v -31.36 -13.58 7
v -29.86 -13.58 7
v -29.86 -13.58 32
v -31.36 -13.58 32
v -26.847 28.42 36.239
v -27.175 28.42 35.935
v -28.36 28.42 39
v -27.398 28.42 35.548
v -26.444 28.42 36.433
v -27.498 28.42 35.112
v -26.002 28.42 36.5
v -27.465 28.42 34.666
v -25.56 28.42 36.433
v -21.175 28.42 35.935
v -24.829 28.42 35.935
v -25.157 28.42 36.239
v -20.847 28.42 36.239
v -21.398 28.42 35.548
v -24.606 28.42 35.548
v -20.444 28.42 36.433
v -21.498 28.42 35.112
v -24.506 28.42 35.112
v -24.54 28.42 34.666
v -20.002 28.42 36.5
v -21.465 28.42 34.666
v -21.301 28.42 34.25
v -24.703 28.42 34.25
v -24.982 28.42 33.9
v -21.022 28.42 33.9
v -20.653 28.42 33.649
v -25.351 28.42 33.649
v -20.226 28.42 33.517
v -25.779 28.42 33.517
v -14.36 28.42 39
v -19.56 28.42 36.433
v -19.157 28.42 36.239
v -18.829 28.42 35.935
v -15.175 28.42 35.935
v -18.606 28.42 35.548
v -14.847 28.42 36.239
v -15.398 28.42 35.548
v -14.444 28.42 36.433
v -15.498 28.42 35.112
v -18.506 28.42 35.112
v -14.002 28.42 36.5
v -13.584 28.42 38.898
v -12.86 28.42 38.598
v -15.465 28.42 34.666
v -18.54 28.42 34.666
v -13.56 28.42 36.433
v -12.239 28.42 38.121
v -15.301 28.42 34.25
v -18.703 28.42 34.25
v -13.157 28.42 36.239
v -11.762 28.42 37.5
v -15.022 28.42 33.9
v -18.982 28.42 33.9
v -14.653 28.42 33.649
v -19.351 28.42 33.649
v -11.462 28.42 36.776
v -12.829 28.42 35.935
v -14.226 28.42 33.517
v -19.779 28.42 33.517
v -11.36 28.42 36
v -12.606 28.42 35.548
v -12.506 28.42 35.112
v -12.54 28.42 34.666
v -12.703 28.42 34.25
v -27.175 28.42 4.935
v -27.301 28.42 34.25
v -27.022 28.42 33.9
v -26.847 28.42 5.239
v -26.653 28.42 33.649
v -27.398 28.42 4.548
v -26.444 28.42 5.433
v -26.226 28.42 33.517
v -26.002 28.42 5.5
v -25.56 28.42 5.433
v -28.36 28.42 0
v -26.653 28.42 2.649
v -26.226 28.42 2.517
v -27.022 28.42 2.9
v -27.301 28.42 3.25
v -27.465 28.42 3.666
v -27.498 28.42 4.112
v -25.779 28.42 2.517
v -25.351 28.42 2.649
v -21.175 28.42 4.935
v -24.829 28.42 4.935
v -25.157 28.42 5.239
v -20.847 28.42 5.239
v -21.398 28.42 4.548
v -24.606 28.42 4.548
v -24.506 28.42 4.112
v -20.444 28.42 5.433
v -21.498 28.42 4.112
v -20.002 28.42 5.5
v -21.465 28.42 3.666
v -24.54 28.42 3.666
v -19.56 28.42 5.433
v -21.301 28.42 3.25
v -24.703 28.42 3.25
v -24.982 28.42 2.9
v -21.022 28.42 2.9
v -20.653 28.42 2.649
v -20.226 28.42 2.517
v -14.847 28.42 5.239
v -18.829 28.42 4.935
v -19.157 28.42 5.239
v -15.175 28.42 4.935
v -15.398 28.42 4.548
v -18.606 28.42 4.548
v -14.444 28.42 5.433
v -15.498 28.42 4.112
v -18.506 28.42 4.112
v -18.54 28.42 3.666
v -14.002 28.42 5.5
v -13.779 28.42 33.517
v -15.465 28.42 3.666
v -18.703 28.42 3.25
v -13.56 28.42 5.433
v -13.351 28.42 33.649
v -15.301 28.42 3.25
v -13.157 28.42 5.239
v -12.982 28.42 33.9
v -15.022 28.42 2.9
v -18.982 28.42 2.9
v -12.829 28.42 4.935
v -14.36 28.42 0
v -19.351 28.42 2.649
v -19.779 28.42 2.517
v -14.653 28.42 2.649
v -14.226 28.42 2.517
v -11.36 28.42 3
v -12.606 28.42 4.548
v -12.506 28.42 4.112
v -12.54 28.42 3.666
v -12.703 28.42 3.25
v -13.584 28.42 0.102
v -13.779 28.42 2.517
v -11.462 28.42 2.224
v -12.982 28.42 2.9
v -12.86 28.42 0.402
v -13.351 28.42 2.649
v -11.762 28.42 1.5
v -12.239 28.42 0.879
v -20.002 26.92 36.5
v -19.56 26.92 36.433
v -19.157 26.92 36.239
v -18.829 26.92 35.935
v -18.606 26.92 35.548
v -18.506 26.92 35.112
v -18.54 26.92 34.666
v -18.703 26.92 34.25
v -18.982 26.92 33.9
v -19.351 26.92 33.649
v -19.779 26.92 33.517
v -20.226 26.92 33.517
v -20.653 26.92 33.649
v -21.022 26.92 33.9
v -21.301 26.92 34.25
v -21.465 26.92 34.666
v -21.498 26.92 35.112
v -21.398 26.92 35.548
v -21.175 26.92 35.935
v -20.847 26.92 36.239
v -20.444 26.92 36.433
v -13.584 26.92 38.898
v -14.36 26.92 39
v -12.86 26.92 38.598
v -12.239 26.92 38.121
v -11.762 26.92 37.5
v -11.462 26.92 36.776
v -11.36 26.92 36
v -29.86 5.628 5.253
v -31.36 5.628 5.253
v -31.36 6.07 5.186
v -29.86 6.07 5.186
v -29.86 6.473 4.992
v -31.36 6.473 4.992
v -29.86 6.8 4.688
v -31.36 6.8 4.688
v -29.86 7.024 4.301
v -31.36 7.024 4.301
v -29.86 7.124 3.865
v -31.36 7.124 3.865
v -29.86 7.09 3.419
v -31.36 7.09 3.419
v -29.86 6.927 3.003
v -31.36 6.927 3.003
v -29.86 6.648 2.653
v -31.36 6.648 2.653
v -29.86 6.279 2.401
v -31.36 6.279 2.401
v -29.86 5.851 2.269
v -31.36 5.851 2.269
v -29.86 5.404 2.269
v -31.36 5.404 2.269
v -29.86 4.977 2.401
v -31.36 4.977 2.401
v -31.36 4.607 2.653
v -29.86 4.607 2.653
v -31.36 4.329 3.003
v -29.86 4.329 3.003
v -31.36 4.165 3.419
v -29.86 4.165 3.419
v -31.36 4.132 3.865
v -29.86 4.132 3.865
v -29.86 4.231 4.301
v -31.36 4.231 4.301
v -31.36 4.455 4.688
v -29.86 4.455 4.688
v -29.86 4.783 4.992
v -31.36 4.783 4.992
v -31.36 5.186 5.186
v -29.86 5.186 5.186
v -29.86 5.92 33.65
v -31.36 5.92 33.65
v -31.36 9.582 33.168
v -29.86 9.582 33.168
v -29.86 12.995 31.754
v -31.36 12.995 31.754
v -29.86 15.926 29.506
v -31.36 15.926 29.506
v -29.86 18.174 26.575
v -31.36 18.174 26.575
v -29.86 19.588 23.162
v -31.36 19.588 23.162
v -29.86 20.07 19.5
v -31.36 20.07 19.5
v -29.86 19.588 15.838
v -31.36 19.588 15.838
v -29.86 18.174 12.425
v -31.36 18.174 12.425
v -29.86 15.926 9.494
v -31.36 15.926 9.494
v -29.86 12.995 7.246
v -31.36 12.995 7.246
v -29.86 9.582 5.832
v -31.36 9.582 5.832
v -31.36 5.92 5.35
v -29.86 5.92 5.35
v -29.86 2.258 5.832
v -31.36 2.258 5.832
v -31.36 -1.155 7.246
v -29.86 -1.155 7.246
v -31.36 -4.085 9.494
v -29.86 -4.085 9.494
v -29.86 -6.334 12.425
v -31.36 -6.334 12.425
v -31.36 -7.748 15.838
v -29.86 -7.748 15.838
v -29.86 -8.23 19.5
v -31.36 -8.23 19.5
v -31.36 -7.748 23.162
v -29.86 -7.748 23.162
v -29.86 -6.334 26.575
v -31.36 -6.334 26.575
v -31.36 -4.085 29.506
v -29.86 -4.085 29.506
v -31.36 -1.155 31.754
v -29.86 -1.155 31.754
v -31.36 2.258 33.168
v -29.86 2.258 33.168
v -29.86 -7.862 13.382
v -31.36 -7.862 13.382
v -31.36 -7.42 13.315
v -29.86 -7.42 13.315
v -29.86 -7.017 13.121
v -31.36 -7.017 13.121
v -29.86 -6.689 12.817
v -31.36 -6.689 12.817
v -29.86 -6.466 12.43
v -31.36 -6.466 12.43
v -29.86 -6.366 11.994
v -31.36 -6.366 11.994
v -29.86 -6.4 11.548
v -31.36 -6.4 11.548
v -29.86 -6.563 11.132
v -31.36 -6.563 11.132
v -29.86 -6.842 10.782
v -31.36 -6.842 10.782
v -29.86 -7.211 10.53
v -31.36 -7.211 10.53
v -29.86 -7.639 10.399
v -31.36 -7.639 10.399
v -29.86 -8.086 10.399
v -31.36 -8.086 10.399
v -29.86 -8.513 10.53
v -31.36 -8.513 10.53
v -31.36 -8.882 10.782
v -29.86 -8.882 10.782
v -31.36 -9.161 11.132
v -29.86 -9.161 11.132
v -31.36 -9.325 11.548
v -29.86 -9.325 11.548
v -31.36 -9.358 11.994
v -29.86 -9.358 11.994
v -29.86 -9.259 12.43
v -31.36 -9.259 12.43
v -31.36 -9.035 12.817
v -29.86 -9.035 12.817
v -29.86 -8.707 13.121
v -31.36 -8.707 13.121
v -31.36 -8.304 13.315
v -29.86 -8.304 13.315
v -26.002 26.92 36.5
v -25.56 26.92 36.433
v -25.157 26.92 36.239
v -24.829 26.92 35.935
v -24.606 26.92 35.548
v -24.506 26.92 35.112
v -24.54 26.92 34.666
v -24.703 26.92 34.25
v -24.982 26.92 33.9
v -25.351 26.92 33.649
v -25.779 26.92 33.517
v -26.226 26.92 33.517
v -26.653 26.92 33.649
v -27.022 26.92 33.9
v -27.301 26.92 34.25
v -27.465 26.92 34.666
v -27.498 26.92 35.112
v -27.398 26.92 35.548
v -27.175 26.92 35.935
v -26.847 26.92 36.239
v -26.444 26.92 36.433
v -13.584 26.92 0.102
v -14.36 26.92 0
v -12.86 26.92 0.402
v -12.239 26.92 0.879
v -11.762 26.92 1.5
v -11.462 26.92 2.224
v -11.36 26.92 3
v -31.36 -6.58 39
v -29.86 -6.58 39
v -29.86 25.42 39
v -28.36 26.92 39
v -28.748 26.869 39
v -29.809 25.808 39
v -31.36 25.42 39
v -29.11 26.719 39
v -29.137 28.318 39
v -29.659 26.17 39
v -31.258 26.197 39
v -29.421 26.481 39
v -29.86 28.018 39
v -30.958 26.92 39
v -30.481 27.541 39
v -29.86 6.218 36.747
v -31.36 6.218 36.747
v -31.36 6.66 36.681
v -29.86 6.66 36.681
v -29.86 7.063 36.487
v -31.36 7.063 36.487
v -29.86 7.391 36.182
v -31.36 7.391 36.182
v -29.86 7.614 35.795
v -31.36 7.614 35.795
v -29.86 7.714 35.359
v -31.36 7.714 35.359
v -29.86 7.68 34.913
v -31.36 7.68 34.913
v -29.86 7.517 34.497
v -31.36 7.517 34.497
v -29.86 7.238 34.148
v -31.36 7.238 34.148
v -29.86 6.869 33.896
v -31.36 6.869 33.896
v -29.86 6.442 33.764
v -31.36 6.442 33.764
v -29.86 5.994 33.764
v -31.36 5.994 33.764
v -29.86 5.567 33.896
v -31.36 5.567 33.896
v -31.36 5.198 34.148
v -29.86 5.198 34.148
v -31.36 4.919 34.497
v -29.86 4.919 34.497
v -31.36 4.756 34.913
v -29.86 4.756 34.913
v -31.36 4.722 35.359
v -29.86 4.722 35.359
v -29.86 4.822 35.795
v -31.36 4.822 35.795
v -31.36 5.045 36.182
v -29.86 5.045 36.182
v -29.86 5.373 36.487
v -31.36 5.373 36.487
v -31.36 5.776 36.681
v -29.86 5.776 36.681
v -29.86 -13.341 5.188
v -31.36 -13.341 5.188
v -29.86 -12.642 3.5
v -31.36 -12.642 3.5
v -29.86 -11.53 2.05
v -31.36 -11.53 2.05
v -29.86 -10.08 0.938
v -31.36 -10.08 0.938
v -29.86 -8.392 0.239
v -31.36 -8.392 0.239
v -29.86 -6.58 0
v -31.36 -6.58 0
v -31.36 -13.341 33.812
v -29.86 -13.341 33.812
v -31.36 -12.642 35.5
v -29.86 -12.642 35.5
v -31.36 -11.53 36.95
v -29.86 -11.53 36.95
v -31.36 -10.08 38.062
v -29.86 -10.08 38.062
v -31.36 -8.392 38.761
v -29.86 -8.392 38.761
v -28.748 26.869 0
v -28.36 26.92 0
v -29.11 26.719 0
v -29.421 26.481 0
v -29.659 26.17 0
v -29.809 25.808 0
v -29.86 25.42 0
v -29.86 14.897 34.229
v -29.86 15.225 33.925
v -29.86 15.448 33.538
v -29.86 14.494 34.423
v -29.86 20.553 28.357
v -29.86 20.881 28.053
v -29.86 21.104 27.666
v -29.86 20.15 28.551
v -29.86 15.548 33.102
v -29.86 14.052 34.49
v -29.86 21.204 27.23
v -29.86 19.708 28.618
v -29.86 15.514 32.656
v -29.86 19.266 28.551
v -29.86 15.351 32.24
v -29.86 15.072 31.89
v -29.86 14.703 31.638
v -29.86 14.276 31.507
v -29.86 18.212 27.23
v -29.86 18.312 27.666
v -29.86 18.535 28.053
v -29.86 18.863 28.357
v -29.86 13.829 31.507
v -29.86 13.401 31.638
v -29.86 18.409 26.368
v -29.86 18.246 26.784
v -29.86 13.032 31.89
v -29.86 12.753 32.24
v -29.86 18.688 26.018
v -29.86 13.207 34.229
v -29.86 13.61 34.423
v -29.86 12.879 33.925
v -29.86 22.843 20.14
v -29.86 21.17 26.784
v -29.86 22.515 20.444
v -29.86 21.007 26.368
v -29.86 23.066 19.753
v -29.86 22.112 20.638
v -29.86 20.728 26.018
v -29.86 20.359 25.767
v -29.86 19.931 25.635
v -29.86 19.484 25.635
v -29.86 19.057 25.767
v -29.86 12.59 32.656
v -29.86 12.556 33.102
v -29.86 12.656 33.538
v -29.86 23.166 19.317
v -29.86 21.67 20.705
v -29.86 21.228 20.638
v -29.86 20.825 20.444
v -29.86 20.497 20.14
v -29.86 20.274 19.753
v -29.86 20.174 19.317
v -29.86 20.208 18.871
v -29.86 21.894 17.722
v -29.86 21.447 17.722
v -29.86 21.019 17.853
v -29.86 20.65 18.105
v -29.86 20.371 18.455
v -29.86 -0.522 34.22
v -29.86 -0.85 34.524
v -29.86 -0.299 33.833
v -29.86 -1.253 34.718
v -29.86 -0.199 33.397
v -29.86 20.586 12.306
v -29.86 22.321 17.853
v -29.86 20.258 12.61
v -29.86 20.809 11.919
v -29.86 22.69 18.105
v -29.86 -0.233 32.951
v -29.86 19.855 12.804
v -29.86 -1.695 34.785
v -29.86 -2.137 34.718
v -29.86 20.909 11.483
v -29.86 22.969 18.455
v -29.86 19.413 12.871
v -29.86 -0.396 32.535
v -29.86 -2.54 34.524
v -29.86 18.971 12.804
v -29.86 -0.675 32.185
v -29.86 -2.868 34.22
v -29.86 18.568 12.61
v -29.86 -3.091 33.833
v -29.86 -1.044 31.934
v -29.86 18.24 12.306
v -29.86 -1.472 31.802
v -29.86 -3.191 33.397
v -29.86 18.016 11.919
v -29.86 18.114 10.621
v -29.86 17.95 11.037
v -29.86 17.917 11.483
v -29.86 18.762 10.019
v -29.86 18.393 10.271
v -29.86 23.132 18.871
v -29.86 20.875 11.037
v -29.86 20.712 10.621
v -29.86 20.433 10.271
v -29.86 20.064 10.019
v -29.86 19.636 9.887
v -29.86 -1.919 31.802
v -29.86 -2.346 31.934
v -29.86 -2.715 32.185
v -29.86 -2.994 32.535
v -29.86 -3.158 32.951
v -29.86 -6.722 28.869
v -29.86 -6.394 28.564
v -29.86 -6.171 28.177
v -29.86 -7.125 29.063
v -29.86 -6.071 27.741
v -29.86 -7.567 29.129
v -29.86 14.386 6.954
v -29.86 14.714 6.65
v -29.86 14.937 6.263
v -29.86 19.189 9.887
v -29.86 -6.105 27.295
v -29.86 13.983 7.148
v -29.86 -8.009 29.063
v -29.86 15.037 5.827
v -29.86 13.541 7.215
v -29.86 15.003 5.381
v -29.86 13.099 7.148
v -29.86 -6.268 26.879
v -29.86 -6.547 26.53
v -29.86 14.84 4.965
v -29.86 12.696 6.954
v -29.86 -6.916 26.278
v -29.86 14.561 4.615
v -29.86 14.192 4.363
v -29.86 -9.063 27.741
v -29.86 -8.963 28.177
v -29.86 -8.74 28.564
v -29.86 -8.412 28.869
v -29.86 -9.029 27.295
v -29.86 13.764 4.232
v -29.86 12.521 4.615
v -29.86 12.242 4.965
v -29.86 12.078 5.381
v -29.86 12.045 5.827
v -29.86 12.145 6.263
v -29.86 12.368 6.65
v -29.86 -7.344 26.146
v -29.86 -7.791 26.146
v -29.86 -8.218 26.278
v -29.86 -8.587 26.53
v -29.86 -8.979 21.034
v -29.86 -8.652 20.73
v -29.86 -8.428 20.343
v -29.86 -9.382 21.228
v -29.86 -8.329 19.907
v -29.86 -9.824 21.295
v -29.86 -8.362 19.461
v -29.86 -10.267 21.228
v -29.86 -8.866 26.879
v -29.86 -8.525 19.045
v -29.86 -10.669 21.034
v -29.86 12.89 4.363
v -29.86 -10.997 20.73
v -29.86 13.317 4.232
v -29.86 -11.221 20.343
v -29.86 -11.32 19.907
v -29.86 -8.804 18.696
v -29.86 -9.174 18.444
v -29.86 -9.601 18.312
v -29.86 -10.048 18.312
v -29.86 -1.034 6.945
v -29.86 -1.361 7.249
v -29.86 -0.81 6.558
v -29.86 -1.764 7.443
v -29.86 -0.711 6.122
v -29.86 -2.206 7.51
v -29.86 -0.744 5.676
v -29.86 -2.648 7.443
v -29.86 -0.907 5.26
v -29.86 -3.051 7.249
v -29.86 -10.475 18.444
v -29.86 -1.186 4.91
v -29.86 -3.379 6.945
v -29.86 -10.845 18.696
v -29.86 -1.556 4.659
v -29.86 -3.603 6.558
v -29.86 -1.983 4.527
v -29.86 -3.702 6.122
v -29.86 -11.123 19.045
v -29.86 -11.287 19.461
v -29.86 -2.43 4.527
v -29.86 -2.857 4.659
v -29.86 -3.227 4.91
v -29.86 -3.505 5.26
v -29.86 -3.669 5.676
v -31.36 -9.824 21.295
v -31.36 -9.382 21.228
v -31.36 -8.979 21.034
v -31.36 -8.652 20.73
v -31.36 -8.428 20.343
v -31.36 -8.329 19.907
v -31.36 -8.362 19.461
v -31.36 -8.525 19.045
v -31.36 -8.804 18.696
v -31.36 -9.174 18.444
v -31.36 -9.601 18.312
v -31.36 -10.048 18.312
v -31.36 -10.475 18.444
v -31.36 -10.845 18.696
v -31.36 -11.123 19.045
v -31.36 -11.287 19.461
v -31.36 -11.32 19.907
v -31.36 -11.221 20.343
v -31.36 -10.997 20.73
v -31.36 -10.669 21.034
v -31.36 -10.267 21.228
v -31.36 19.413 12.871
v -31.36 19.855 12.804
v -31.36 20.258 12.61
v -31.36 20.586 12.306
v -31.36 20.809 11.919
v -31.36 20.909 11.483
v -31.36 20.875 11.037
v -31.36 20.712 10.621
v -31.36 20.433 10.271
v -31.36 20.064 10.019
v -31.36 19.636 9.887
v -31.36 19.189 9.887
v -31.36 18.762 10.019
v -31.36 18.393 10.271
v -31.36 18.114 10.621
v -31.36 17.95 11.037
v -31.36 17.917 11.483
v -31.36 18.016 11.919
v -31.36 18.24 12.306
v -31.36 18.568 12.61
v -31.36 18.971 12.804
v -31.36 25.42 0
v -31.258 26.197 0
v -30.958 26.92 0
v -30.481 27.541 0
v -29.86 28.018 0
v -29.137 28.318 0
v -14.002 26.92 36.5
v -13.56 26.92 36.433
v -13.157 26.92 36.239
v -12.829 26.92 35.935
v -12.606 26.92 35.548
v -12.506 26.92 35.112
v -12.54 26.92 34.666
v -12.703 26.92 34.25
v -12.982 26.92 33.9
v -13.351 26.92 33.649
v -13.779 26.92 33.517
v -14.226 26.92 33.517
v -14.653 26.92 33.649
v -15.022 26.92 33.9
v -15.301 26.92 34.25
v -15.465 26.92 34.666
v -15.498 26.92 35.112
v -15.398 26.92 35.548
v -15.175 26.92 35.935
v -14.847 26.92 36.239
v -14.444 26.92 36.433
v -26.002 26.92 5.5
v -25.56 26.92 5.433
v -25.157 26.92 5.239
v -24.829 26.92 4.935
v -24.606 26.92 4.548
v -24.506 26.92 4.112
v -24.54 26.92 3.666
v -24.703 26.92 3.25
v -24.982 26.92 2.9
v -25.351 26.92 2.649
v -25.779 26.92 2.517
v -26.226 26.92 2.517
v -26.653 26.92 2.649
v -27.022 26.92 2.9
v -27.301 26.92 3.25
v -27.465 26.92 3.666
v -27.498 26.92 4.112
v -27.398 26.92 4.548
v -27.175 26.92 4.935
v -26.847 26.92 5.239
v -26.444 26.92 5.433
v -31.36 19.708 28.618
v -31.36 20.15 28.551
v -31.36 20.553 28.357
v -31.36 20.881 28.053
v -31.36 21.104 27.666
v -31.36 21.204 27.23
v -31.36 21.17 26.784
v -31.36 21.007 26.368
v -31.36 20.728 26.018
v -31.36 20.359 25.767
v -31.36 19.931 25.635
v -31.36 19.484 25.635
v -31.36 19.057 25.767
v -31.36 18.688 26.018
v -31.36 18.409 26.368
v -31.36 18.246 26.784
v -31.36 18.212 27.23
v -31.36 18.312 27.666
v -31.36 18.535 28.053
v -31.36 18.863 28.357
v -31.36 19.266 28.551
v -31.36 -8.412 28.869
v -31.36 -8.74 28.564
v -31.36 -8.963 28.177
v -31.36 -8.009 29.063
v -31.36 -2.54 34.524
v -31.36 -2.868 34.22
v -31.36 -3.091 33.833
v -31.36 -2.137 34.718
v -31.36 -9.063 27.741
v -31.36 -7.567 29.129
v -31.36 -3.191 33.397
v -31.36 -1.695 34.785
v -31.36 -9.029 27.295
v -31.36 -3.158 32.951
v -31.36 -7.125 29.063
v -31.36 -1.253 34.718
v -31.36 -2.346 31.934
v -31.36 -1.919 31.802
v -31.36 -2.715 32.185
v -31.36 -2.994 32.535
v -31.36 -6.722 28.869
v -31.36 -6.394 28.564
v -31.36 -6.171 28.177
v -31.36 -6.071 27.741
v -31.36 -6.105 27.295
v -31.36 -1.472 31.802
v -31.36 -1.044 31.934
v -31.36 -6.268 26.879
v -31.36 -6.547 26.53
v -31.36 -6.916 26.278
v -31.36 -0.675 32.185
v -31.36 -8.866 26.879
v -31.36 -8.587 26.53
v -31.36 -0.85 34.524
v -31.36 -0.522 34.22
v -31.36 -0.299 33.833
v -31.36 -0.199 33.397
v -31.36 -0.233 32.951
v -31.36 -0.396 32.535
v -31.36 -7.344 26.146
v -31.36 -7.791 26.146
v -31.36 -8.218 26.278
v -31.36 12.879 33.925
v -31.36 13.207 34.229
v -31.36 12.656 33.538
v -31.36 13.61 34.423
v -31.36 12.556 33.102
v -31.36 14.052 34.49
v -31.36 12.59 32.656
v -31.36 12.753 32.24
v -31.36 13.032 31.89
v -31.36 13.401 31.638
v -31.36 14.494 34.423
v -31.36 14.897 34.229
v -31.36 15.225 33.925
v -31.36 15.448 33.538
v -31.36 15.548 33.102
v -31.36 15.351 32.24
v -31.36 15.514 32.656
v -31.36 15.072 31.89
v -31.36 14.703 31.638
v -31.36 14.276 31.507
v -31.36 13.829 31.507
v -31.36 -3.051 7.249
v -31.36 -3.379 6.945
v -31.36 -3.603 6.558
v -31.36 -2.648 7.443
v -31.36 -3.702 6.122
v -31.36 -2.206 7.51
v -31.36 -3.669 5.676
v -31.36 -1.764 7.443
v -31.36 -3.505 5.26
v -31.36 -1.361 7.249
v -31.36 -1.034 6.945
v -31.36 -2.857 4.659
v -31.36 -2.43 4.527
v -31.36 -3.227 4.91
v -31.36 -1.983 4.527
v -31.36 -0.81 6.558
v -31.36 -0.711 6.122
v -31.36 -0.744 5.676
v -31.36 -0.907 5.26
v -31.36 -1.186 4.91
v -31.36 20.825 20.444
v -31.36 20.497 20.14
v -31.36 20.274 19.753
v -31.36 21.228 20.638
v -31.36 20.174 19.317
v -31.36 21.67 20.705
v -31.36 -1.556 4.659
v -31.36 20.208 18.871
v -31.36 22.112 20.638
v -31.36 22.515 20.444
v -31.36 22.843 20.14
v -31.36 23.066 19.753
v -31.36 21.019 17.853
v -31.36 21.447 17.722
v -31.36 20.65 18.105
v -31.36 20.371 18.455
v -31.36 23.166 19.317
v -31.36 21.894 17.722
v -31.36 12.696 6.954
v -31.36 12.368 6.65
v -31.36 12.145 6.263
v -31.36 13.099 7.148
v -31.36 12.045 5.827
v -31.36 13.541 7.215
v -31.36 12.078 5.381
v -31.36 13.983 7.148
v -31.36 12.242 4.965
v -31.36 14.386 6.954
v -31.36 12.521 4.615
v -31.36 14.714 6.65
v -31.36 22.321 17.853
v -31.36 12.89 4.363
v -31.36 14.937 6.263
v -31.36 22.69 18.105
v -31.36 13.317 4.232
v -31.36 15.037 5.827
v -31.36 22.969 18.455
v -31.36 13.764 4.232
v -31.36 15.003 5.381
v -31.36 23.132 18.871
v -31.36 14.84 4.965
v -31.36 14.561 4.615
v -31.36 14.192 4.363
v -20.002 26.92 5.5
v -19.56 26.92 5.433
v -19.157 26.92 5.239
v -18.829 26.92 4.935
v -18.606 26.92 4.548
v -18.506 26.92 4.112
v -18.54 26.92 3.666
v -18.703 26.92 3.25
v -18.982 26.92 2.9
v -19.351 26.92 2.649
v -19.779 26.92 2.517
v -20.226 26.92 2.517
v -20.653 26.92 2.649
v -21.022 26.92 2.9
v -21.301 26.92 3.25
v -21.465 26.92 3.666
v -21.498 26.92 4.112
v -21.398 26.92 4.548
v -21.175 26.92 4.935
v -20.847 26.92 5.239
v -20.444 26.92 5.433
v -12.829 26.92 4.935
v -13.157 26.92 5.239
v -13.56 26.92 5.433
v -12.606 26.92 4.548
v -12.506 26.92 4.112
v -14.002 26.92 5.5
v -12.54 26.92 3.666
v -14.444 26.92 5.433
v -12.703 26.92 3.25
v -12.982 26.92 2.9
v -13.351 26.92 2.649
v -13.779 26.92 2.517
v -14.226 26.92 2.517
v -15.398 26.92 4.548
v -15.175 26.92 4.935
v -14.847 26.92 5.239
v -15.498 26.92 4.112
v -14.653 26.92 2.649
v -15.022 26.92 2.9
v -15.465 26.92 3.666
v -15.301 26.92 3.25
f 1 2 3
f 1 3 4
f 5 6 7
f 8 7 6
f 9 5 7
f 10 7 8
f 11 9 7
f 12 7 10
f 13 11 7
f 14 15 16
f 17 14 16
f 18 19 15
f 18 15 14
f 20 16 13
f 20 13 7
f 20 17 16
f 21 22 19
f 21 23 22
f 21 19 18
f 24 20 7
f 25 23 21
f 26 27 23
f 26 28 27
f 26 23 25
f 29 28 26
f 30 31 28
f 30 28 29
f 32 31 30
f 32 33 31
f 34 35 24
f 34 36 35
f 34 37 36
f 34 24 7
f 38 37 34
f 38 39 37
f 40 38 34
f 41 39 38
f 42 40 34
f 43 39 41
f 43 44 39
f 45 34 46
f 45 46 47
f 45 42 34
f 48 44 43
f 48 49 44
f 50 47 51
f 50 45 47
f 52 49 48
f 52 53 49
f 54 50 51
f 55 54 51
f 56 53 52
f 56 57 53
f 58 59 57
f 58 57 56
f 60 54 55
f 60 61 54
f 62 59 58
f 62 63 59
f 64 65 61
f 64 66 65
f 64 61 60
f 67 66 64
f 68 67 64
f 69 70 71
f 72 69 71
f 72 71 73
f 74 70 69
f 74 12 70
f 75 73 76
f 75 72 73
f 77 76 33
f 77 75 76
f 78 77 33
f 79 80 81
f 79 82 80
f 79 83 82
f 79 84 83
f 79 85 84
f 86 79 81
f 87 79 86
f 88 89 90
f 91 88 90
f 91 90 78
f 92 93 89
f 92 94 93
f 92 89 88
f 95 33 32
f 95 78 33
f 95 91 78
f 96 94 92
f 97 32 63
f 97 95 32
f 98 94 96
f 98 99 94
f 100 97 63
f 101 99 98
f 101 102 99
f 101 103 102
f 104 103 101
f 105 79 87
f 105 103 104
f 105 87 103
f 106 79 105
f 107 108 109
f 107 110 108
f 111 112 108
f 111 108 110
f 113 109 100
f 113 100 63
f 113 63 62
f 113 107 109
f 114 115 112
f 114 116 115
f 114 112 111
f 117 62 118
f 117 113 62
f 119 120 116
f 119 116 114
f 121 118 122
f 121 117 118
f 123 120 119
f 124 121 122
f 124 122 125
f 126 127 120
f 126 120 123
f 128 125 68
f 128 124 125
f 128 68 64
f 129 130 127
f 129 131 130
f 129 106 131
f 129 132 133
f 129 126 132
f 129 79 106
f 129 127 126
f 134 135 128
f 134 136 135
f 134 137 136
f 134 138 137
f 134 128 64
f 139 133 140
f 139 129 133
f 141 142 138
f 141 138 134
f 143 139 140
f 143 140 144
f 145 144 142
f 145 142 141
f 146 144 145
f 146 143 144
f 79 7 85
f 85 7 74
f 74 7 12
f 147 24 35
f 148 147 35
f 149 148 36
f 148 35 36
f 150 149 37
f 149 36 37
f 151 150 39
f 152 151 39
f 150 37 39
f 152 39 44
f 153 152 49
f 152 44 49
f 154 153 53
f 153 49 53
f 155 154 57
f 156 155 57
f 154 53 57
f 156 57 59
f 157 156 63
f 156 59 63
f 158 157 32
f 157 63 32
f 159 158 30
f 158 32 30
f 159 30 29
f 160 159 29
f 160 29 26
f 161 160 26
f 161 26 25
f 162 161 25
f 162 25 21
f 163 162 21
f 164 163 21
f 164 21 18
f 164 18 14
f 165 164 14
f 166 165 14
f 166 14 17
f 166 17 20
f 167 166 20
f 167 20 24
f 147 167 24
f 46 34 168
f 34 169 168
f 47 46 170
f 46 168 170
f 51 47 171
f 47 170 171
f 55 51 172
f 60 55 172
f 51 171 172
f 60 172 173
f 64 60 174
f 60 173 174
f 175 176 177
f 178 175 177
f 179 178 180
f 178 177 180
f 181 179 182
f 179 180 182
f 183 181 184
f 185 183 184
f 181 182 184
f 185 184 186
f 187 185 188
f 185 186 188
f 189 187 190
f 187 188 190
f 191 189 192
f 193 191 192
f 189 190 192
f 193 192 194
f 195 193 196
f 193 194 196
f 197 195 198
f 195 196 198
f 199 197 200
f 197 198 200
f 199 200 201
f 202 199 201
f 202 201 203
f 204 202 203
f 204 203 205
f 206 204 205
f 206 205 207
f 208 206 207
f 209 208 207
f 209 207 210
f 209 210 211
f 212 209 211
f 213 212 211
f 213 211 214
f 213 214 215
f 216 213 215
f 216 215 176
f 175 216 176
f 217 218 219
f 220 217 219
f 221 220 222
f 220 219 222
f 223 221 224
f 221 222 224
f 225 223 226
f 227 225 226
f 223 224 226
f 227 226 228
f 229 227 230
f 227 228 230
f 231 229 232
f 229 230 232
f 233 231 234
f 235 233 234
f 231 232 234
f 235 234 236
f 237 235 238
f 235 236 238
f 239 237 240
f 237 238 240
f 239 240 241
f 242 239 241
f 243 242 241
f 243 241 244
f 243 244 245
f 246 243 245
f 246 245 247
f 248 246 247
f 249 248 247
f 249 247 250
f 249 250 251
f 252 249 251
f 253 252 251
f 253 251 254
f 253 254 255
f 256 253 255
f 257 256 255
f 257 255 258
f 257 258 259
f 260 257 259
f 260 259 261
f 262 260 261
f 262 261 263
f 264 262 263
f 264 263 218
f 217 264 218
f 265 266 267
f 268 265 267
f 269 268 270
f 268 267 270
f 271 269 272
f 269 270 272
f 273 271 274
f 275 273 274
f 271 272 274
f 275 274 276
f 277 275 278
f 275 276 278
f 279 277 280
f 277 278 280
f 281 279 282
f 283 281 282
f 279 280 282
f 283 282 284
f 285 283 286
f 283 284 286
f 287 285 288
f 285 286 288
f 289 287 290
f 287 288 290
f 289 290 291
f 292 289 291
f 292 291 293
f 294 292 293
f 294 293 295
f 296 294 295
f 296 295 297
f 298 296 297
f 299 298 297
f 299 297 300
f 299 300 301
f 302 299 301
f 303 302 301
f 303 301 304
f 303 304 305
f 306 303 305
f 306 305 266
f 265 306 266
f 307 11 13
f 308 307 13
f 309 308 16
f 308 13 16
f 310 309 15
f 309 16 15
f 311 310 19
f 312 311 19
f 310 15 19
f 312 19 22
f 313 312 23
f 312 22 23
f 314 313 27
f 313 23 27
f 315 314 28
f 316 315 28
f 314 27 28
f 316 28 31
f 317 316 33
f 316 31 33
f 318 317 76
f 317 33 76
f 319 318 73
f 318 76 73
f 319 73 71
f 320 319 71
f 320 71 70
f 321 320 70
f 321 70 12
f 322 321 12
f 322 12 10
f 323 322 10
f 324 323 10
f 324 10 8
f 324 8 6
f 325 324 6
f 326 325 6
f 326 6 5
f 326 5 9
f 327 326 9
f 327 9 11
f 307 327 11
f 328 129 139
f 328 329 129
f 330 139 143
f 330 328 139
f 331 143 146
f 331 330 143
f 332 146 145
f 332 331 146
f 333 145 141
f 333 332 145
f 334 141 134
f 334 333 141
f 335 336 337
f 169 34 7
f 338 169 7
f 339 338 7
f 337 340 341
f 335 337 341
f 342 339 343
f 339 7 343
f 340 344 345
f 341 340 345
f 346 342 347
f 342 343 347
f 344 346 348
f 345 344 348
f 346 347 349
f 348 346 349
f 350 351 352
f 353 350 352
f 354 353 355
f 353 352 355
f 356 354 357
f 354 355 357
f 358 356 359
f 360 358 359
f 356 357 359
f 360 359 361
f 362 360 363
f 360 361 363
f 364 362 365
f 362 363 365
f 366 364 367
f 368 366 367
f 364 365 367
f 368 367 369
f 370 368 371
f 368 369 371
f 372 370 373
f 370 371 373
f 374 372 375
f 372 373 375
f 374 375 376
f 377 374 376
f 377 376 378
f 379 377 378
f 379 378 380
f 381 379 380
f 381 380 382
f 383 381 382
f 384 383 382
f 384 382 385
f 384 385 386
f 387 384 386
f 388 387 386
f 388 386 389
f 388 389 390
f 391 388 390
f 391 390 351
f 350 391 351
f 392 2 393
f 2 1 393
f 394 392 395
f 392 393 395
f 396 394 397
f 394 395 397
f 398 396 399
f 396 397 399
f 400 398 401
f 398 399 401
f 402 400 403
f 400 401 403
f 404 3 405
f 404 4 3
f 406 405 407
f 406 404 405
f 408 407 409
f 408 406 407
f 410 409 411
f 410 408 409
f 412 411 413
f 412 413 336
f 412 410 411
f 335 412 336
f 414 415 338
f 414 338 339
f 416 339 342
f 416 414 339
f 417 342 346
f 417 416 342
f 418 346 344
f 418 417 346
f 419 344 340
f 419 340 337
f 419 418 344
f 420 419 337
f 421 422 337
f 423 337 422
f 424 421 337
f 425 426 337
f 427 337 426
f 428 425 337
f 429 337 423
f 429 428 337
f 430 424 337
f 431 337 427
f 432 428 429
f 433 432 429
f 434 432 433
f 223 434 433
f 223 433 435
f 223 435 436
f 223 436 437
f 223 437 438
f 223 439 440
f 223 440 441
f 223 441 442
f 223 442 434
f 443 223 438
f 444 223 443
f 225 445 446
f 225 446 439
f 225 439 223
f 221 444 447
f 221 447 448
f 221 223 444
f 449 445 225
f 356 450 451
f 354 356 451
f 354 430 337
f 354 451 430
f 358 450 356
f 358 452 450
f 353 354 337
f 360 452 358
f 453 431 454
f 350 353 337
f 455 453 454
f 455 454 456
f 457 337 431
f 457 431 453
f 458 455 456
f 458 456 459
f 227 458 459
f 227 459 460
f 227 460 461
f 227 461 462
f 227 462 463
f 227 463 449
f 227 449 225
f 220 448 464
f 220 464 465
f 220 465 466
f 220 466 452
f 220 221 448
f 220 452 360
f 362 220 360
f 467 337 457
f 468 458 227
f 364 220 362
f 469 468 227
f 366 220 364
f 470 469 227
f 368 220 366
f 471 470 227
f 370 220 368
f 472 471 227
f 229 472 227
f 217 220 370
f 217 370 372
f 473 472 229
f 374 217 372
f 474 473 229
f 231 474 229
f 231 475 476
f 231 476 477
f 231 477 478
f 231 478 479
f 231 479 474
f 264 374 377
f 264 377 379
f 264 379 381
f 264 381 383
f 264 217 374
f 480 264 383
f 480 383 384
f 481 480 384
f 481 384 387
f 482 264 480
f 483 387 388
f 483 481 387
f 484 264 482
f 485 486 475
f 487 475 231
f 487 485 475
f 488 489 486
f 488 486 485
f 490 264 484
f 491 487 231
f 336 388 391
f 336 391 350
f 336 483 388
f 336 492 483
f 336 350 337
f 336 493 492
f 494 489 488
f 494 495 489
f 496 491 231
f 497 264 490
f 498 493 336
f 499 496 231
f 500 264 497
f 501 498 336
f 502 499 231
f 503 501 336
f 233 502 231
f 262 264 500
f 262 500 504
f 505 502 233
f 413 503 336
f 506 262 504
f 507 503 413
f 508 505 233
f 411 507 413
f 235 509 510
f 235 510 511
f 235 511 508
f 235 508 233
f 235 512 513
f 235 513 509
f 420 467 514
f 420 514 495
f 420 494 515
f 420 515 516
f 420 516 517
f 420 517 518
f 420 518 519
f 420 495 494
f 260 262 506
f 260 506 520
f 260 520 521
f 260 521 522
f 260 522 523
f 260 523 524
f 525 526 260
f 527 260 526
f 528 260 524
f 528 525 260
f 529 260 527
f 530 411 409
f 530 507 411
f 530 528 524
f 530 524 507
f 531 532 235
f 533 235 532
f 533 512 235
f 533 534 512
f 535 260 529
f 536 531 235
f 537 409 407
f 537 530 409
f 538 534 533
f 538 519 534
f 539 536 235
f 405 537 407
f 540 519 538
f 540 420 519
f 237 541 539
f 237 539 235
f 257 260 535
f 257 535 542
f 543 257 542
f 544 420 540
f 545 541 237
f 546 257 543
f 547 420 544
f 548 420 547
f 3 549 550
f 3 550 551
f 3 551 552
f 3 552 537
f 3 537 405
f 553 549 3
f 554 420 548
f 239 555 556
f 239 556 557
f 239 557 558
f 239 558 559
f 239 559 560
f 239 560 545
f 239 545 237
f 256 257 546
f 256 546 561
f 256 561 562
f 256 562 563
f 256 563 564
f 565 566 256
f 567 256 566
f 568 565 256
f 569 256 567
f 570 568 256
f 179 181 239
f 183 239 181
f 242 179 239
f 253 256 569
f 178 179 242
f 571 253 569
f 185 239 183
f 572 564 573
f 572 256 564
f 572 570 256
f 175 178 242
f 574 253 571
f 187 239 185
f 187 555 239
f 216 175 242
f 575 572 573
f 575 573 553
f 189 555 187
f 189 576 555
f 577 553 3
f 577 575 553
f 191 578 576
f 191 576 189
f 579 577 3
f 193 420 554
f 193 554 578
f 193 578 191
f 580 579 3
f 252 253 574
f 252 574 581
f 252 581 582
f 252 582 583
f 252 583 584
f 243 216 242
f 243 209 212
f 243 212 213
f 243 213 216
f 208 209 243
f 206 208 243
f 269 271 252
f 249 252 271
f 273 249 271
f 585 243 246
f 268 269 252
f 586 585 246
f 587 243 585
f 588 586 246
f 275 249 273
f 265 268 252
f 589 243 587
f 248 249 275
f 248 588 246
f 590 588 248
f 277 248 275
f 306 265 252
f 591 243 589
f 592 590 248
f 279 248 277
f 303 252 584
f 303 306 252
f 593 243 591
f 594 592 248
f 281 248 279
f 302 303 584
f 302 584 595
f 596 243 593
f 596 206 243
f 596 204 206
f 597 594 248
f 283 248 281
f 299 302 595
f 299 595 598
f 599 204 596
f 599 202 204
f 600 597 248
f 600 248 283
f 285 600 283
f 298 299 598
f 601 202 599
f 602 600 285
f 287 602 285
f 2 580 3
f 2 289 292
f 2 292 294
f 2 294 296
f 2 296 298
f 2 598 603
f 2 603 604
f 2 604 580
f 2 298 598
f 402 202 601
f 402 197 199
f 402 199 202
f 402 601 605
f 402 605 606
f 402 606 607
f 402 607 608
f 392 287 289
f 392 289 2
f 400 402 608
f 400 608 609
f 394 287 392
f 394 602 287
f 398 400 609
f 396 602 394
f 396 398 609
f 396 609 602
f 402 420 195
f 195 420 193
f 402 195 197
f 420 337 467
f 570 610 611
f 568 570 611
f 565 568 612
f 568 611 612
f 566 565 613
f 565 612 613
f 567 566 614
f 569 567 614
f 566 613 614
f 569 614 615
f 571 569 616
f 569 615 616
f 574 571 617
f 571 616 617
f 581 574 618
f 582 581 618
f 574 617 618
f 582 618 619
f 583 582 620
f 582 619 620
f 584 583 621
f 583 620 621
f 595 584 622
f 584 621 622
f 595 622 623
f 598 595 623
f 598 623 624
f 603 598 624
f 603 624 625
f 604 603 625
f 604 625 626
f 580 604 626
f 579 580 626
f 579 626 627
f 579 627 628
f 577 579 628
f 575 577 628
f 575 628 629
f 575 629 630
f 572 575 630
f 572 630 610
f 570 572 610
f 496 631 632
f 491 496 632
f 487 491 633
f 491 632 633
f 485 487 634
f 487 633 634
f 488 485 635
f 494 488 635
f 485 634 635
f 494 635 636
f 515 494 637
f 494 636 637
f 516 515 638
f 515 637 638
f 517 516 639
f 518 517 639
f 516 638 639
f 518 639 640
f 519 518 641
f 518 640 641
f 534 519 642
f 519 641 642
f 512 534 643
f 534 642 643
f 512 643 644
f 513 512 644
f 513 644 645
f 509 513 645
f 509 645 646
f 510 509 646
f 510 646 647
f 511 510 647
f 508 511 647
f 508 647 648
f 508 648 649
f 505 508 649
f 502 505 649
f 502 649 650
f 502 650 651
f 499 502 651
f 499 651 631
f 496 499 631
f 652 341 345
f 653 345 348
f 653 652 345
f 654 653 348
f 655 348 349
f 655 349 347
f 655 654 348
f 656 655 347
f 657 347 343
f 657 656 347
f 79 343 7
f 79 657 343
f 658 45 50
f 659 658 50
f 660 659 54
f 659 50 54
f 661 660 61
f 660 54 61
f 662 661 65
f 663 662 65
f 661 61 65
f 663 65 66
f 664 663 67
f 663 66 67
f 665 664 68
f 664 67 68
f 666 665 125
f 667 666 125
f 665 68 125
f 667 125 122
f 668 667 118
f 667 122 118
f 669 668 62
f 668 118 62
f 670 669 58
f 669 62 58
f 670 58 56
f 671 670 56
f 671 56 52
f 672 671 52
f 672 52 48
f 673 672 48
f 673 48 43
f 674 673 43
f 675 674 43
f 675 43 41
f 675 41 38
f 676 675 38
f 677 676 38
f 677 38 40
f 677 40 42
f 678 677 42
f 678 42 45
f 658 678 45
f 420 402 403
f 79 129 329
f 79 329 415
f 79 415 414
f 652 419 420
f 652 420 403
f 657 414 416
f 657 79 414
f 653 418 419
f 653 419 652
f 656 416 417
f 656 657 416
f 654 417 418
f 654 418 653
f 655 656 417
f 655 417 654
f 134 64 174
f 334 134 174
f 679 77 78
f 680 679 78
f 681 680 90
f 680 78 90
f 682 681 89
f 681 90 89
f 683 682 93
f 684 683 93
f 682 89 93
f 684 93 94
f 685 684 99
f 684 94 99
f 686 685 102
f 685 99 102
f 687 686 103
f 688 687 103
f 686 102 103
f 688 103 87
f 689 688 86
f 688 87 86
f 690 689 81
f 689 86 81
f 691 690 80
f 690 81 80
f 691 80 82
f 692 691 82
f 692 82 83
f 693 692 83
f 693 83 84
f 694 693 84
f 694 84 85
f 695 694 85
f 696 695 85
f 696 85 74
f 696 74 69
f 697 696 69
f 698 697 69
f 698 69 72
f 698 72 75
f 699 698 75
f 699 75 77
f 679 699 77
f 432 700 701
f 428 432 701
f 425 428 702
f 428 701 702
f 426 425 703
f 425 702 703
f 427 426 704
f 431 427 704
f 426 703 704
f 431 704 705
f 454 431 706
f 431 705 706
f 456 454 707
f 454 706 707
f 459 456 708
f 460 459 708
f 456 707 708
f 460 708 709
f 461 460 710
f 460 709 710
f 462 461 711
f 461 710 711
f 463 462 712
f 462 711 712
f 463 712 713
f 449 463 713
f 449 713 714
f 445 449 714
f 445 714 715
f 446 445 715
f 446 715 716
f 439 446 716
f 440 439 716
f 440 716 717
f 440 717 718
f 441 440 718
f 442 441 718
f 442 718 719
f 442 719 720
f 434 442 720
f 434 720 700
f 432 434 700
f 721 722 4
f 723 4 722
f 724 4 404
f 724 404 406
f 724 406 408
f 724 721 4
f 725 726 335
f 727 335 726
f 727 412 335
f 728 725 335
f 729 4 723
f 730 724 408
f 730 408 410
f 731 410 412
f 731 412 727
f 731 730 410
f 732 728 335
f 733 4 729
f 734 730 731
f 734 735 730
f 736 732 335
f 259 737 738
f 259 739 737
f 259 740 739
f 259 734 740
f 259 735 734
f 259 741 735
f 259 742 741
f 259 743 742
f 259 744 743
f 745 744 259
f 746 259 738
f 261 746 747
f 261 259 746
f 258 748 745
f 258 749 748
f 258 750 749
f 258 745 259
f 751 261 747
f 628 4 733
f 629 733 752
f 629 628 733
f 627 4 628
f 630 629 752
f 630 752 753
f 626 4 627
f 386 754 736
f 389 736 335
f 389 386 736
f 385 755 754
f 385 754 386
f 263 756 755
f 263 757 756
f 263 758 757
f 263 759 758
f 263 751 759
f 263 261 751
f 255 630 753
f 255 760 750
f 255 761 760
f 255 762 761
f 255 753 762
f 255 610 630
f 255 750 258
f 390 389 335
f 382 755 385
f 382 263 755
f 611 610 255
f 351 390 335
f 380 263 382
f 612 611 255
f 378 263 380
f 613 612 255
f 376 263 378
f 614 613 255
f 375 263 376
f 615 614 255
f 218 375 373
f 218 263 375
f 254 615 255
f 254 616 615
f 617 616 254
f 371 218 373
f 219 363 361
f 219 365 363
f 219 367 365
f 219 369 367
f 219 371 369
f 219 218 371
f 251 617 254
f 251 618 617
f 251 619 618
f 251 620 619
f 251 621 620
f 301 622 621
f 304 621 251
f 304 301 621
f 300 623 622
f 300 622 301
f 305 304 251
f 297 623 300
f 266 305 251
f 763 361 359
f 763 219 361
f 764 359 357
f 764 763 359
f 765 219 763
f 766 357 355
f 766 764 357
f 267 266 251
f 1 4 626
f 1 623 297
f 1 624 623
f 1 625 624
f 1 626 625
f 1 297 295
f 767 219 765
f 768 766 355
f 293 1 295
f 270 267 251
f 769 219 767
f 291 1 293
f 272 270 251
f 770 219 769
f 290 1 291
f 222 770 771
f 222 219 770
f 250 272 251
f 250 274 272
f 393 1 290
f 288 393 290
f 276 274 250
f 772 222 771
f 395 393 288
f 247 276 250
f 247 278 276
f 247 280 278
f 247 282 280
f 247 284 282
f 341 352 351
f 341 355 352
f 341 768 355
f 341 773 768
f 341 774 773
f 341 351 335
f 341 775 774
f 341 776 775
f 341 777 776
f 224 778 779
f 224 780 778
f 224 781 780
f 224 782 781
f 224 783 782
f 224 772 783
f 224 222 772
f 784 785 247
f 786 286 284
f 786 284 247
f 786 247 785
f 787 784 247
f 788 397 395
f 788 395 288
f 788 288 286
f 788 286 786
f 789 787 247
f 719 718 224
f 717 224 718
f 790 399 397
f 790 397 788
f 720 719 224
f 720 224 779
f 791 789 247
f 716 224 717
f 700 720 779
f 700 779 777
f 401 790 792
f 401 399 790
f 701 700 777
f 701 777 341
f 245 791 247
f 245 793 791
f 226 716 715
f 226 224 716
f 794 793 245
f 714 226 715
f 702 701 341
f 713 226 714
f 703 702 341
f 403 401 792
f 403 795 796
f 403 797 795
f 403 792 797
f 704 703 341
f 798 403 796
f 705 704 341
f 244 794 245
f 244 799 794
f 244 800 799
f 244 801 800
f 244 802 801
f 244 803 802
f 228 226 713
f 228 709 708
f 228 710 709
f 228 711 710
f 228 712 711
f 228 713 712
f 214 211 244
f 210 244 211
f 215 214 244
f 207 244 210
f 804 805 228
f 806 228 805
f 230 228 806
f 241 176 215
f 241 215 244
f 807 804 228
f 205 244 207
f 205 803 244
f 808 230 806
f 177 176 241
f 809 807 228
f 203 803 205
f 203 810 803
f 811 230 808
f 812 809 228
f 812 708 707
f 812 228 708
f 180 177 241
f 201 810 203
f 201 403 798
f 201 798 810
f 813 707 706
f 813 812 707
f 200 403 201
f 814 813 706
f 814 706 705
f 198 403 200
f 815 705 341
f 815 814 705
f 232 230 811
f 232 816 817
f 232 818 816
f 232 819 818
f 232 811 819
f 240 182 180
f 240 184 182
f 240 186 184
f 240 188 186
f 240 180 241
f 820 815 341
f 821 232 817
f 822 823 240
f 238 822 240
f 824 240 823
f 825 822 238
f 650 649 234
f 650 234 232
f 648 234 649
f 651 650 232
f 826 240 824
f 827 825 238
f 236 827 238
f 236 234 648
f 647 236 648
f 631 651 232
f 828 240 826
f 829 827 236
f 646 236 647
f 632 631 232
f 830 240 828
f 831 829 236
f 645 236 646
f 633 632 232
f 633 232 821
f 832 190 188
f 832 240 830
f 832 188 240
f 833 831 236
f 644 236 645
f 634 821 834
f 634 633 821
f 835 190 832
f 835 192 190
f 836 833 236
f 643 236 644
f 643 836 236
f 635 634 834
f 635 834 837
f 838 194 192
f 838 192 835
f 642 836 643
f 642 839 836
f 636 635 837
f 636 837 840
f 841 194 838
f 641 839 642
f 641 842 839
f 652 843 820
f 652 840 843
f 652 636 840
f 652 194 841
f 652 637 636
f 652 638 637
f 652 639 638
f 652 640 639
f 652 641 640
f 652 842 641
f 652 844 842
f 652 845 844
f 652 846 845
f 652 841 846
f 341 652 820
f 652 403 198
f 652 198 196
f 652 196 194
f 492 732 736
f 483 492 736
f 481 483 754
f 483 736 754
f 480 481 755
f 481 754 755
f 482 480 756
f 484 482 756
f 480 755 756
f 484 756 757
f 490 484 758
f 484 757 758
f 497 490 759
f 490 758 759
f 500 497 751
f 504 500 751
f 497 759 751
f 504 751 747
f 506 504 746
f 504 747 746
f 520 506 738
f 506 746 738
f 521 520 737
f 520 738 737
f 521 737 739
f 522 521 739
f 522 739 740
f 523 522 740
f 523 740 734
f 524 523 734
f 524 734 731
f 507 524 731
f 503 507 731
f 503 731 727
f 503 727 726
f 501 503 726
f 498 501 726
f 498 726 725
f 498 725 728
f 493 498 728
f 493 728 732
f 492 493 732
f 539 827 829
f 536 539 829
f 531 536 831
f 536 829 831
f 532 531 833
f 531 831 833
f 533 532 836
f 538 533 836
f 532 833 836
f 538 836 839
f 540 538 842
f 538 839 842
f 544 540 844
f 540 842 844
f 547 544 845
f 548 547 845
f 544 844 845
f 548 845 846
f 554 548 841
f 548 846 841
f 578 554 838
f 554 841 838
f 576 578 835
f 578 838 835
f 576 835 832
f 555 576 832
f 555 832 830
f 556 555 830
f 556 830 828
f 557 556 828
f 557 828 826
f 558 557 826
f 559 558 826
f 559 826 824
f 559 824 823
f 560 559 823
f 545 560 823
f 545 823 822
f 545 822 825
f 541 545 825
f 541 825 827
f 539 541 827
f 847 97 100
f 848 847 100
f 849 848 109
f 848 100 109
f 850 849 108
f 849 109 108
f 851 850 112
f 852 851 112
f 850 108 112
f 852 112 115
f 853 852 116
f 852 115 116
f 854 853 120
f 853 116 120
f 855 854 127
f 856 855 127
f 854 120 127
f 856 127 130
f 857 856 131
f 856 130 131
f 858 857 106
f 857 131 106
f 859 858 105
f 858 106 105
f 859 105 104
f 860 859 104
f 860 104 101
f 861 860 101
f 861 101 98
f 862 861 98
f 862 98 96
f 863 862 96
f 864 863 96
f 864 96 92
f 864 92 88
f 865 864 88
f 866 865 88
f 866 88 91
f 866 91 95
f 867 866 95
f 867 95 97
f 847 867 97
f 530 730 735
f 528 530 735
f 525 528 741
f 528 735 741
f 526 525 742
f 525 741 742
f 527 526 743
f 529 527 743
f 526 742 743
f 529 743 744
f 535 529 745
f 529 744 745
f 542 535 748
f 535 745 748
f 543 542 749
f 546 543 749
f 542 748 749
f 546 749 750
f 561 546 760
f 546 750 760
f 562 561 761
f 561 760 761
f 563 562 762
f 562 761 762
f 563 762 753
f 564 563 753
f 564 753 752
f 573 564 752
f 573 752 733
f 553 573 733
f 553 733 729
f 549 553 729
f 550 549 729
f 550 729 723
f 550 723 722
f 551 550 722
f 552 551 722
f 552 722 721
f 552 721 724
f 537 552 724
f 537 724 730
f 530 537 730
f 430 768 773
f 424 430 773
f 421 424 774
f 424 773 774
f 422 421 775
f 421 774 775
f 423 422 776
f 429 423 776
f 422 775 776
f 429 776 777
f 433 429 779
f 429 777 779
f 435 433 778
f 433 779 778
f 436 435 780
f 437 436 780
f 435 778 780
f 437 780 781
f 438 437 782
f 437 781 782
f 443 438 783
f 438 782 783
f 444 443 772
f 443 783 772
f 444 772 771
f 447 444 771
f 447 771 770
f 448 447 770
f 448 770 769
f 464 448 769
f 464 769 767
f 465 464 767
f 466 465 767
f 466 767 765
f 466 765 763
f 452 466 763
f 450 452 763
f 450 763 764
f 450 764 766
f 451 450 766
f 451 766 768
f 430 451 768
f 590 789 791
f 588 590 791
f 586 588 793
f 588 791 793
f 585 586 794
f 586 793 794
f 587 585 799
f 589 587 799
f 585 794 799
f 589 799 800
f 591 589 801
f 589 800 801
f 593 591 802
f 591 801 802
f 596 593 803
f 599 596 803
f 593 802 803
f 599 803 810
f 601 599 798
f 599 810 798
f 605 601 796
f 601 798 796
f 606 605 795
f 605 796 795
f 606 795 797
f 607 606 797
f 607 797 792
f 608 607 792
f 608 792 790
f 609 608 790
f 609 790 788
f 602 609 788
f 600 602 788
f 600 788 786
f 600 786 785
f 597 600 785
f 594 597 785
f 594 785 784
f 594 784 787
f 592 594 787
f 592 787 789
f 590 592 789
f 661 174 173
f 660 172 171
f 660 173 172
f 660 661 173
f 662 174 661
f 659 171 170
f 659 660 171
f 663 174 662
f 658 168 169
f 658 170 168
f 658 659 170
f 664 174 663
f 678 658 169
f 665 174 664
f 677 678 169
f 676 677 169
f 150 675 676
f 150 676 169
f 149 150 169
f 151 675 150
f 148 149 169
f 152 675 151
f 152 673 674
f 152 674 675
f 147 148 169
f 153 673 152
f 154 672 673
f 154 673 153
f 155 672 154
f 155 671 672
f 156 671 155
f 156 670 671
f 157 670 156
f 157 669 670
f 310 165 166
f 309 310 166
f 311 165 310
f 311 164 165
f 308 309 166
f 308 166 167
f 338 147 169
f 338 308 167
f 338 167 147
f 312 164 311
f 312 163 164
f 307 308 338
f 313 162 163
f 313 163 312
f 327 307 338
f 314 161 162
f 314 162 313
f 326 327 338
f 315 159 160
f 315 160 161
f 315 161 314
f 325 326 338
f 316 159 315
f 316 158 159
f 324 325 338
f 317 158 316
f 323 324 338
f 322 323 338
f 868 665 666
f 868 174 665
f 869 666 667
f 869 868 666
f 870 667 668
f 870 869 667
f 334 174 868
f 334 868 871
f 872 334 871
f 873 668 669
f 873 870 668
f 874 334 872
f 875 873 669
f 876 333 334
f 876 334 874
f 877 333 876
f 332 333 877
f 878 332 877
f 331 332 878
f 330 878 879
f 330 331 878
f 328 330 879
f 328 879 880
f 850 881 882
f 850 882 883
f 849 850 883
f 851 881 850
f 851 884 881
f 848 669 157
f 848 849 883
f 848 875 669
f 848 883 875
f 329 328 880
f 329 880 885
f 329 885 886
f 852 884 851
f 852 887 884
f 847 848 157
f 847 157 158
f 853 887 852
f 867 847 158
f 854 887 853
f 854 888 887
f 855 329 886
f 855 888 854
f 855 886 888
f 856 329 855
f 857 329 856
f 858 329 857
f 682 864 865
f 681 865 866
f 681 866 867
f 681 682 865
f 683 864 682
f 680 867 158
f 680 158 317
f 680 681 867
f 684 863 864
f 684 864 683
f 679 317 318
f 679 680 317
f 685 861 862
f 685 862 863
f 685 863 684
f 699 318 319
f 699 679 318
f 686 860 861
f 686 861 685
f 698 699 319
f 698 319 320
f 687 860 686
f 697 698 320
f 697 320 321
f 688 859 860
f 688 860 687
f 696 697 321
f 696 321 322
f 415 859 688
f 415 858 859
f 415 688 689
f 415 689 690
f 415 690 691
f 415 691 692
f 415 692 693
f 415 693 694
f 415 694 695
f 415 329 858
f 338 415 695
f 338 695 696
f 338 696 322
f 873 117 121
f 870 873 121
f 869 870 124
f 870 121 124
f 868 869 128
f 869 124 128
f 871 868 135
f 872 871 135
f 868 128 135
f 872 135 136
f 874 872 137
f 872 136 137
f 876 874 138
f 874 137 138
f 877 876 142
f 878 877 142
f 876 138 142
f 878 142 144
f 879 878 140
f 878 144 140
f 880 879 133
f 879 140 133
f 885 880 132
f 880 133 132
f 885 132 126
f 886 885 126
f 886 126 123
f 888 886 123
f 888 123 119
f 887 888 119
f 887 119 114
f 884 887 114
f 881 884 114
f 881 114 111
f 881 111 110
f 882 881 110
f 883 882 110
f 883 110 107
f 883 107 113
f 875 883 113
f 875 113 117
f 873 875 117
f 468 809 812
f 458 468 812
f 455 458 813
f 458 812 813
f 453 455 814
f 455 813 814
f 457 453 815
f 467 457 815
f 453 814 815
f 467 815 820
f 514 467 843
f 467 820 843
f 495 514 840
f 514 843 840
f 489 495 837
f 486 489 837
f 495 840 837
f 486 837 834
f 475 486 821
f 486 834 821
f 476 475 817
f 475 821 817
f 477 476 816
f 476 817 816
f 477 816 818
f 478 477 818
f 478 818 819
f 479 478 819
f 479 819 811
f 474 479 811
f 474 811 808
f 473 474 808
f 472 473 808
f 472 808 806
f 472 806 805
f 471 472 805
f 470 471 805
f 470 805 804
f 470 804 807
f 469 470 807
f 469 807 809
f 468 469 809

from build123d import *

# Parameters (mm, degrees)
BASE_FLANGE1_DEPTH = 39
FILLET1_R          = 7
FILLET2_R          = 3
SKETCH6_R          = 14.15
CUT_EXTRUDE1_DEPTH = 10
SKETCH12_R         = 1.5
CUT_EXTRUDE2_DEPTH = 10
SKETCH13_R         = 1.5
CUT_EXTRUDE3_DEPTH = 10


# Sheet-metal steps are written as plain solids
with BuildPart() as part:
    # Sketch1 → Base-Flange1 (new body)
    with BuildSketch(Plane.XY):
        with BuildLine():
            Line((-31.36010038, -13.579909031), (-31.36010038, 25.420090969))
            ThreePointArc((-31.36010038, 25.420090969), (-30.481420723, 27.541411313), (-28.36010038, 28.420090969))
            Line((-28.36010038, 28.420090969), (-11.36010038, 28.420090969))
            Line((-11.36010038, 28.420090969), (-11.36010038, 26.920090969))
            Line((-11.36010038, 26.920090969), (-28.36010038, 26.920090969))
            ThreePointArc((-28.36010038, 26.920090969), (-29.420760552, 26.480751141), (-29.86010038, 25.420090969))
            Line((-29.86010038, 25.420090969), (-29.86010038, -13.579909031))
            Line((-29.86010038, -13.579909031), (-31.36010038, -13.579909031))
        make_face()
    extrude(amount=BASE_FLANGE1_DEPTH)

    # Fillet1
    fillet1_edges = [part.edges().sort_by_distance(p)[0] for p in [
        (-30.61010038, -13.579909031, 39),
        (-30.61010038, -13.579909031, 0),
    ]]
    fillet(fillet1_edges, radius=FILLET1_R)

    # Fillet2
    fillet2_edges = [part.edges().sort_by_distance(p)[0] for p in [
        (-11.36010038, 27.670090969, 39),
        (-11.36010038, 27.670090969, 0),
    ]]
    fillet(fillet2_edges, radius=FILLET2_R)

    # Sketch6 → Cut-Extrude1 (cut)
    with BuildSketch(Plane.ZY.offset(31.36010038)):
        with Locations((19.5, 5.920090969)):
            Circle(SKETCH6_R)
    extrude(amount=-CUT_EXTRUDE1_DEPTH, mode=Mode.SUBTRACT)

    # Sketch12 → Cut-Extrude2 (cut)
    with BuildSketch(Plane.ZY.offset(31.36010038)):
        with Locations((19.204809579, 21.670090969)):
            Circle(SKETCH12_R)
        with Locations((27.117967884, 19.707930885)):
            Circle(SKETCH12_R)
        with Locations((32.989883957, 14.052071253)):
            Circle(SKETCH12_R)
        with Locations((35.24718263, 6.217995095)):
            Circle(SKETCH12_R)
        with Locations((33.285022545, -1.695163209)):
            Circle(SKETCH12_R)
        with Locations((27.629162914, -7.567079283)):
            Circle(SKETCH12_R)
        with Locations((19.795086756, -9.824377956)):
            Circle(SKETCH12_R)
        with Locations((11.881928451, -7.862217871)):
            Circle(SKETCH12_R)
        with Locations((6.010012378, -2.206358239)):
            Circle(SKETCH12_R)
        with Locations((3.752713705, 5.627717919)):
            Circle(SKETCH12_R)
        with Locations((5.71487379, 13.540876223)):
            Circle(SKETCH12_R)
        with Locations((11.370733421, 19.412792296)):
            Circle(SKETCH12_R)
    extrude(amount=-CUT_EXTRUDE2_DEPTH, mode=Mode.SUBTRACT)

    # Sketch13 → Cut-Extrude3 (cut)
    with BuildSketch(Plane(origin=(0, 28.420090969, 0), x_dir=(1, 0, 0), z_dir=(0, 1, 0))):
        with Locations(Location((-26.002140867, -4, 0), (0, 0, 270))):
            Circle(SKETCH13_R)
        with Locations(Location((-20.002140867, -4, 0), (0, 0, 270))):
            Circle(SKETCH13_R)
        with Locations(Location((-14.002140867, -4, 0), (0, 0, 270))):
            Circle(SKETCH13_R)
        with Locations(Location((-20.002140867, -35, 0), (0, 0, 270))):
            Circle(SKETCH13_R)
        with Locations(Location((-14.002140867, -35, 0), (0, 0, 270))):
            Circle(SKETCH13_R)
        with Locations(Location((-26.002140867, -35, 0), (0, 0, 270))):
            Circle(SKETCH13_R)
    extrude(amount=-CUT_EXTRUDE3_DEPTH, mode=Mode.SUBTRACT)


solid = part.part
